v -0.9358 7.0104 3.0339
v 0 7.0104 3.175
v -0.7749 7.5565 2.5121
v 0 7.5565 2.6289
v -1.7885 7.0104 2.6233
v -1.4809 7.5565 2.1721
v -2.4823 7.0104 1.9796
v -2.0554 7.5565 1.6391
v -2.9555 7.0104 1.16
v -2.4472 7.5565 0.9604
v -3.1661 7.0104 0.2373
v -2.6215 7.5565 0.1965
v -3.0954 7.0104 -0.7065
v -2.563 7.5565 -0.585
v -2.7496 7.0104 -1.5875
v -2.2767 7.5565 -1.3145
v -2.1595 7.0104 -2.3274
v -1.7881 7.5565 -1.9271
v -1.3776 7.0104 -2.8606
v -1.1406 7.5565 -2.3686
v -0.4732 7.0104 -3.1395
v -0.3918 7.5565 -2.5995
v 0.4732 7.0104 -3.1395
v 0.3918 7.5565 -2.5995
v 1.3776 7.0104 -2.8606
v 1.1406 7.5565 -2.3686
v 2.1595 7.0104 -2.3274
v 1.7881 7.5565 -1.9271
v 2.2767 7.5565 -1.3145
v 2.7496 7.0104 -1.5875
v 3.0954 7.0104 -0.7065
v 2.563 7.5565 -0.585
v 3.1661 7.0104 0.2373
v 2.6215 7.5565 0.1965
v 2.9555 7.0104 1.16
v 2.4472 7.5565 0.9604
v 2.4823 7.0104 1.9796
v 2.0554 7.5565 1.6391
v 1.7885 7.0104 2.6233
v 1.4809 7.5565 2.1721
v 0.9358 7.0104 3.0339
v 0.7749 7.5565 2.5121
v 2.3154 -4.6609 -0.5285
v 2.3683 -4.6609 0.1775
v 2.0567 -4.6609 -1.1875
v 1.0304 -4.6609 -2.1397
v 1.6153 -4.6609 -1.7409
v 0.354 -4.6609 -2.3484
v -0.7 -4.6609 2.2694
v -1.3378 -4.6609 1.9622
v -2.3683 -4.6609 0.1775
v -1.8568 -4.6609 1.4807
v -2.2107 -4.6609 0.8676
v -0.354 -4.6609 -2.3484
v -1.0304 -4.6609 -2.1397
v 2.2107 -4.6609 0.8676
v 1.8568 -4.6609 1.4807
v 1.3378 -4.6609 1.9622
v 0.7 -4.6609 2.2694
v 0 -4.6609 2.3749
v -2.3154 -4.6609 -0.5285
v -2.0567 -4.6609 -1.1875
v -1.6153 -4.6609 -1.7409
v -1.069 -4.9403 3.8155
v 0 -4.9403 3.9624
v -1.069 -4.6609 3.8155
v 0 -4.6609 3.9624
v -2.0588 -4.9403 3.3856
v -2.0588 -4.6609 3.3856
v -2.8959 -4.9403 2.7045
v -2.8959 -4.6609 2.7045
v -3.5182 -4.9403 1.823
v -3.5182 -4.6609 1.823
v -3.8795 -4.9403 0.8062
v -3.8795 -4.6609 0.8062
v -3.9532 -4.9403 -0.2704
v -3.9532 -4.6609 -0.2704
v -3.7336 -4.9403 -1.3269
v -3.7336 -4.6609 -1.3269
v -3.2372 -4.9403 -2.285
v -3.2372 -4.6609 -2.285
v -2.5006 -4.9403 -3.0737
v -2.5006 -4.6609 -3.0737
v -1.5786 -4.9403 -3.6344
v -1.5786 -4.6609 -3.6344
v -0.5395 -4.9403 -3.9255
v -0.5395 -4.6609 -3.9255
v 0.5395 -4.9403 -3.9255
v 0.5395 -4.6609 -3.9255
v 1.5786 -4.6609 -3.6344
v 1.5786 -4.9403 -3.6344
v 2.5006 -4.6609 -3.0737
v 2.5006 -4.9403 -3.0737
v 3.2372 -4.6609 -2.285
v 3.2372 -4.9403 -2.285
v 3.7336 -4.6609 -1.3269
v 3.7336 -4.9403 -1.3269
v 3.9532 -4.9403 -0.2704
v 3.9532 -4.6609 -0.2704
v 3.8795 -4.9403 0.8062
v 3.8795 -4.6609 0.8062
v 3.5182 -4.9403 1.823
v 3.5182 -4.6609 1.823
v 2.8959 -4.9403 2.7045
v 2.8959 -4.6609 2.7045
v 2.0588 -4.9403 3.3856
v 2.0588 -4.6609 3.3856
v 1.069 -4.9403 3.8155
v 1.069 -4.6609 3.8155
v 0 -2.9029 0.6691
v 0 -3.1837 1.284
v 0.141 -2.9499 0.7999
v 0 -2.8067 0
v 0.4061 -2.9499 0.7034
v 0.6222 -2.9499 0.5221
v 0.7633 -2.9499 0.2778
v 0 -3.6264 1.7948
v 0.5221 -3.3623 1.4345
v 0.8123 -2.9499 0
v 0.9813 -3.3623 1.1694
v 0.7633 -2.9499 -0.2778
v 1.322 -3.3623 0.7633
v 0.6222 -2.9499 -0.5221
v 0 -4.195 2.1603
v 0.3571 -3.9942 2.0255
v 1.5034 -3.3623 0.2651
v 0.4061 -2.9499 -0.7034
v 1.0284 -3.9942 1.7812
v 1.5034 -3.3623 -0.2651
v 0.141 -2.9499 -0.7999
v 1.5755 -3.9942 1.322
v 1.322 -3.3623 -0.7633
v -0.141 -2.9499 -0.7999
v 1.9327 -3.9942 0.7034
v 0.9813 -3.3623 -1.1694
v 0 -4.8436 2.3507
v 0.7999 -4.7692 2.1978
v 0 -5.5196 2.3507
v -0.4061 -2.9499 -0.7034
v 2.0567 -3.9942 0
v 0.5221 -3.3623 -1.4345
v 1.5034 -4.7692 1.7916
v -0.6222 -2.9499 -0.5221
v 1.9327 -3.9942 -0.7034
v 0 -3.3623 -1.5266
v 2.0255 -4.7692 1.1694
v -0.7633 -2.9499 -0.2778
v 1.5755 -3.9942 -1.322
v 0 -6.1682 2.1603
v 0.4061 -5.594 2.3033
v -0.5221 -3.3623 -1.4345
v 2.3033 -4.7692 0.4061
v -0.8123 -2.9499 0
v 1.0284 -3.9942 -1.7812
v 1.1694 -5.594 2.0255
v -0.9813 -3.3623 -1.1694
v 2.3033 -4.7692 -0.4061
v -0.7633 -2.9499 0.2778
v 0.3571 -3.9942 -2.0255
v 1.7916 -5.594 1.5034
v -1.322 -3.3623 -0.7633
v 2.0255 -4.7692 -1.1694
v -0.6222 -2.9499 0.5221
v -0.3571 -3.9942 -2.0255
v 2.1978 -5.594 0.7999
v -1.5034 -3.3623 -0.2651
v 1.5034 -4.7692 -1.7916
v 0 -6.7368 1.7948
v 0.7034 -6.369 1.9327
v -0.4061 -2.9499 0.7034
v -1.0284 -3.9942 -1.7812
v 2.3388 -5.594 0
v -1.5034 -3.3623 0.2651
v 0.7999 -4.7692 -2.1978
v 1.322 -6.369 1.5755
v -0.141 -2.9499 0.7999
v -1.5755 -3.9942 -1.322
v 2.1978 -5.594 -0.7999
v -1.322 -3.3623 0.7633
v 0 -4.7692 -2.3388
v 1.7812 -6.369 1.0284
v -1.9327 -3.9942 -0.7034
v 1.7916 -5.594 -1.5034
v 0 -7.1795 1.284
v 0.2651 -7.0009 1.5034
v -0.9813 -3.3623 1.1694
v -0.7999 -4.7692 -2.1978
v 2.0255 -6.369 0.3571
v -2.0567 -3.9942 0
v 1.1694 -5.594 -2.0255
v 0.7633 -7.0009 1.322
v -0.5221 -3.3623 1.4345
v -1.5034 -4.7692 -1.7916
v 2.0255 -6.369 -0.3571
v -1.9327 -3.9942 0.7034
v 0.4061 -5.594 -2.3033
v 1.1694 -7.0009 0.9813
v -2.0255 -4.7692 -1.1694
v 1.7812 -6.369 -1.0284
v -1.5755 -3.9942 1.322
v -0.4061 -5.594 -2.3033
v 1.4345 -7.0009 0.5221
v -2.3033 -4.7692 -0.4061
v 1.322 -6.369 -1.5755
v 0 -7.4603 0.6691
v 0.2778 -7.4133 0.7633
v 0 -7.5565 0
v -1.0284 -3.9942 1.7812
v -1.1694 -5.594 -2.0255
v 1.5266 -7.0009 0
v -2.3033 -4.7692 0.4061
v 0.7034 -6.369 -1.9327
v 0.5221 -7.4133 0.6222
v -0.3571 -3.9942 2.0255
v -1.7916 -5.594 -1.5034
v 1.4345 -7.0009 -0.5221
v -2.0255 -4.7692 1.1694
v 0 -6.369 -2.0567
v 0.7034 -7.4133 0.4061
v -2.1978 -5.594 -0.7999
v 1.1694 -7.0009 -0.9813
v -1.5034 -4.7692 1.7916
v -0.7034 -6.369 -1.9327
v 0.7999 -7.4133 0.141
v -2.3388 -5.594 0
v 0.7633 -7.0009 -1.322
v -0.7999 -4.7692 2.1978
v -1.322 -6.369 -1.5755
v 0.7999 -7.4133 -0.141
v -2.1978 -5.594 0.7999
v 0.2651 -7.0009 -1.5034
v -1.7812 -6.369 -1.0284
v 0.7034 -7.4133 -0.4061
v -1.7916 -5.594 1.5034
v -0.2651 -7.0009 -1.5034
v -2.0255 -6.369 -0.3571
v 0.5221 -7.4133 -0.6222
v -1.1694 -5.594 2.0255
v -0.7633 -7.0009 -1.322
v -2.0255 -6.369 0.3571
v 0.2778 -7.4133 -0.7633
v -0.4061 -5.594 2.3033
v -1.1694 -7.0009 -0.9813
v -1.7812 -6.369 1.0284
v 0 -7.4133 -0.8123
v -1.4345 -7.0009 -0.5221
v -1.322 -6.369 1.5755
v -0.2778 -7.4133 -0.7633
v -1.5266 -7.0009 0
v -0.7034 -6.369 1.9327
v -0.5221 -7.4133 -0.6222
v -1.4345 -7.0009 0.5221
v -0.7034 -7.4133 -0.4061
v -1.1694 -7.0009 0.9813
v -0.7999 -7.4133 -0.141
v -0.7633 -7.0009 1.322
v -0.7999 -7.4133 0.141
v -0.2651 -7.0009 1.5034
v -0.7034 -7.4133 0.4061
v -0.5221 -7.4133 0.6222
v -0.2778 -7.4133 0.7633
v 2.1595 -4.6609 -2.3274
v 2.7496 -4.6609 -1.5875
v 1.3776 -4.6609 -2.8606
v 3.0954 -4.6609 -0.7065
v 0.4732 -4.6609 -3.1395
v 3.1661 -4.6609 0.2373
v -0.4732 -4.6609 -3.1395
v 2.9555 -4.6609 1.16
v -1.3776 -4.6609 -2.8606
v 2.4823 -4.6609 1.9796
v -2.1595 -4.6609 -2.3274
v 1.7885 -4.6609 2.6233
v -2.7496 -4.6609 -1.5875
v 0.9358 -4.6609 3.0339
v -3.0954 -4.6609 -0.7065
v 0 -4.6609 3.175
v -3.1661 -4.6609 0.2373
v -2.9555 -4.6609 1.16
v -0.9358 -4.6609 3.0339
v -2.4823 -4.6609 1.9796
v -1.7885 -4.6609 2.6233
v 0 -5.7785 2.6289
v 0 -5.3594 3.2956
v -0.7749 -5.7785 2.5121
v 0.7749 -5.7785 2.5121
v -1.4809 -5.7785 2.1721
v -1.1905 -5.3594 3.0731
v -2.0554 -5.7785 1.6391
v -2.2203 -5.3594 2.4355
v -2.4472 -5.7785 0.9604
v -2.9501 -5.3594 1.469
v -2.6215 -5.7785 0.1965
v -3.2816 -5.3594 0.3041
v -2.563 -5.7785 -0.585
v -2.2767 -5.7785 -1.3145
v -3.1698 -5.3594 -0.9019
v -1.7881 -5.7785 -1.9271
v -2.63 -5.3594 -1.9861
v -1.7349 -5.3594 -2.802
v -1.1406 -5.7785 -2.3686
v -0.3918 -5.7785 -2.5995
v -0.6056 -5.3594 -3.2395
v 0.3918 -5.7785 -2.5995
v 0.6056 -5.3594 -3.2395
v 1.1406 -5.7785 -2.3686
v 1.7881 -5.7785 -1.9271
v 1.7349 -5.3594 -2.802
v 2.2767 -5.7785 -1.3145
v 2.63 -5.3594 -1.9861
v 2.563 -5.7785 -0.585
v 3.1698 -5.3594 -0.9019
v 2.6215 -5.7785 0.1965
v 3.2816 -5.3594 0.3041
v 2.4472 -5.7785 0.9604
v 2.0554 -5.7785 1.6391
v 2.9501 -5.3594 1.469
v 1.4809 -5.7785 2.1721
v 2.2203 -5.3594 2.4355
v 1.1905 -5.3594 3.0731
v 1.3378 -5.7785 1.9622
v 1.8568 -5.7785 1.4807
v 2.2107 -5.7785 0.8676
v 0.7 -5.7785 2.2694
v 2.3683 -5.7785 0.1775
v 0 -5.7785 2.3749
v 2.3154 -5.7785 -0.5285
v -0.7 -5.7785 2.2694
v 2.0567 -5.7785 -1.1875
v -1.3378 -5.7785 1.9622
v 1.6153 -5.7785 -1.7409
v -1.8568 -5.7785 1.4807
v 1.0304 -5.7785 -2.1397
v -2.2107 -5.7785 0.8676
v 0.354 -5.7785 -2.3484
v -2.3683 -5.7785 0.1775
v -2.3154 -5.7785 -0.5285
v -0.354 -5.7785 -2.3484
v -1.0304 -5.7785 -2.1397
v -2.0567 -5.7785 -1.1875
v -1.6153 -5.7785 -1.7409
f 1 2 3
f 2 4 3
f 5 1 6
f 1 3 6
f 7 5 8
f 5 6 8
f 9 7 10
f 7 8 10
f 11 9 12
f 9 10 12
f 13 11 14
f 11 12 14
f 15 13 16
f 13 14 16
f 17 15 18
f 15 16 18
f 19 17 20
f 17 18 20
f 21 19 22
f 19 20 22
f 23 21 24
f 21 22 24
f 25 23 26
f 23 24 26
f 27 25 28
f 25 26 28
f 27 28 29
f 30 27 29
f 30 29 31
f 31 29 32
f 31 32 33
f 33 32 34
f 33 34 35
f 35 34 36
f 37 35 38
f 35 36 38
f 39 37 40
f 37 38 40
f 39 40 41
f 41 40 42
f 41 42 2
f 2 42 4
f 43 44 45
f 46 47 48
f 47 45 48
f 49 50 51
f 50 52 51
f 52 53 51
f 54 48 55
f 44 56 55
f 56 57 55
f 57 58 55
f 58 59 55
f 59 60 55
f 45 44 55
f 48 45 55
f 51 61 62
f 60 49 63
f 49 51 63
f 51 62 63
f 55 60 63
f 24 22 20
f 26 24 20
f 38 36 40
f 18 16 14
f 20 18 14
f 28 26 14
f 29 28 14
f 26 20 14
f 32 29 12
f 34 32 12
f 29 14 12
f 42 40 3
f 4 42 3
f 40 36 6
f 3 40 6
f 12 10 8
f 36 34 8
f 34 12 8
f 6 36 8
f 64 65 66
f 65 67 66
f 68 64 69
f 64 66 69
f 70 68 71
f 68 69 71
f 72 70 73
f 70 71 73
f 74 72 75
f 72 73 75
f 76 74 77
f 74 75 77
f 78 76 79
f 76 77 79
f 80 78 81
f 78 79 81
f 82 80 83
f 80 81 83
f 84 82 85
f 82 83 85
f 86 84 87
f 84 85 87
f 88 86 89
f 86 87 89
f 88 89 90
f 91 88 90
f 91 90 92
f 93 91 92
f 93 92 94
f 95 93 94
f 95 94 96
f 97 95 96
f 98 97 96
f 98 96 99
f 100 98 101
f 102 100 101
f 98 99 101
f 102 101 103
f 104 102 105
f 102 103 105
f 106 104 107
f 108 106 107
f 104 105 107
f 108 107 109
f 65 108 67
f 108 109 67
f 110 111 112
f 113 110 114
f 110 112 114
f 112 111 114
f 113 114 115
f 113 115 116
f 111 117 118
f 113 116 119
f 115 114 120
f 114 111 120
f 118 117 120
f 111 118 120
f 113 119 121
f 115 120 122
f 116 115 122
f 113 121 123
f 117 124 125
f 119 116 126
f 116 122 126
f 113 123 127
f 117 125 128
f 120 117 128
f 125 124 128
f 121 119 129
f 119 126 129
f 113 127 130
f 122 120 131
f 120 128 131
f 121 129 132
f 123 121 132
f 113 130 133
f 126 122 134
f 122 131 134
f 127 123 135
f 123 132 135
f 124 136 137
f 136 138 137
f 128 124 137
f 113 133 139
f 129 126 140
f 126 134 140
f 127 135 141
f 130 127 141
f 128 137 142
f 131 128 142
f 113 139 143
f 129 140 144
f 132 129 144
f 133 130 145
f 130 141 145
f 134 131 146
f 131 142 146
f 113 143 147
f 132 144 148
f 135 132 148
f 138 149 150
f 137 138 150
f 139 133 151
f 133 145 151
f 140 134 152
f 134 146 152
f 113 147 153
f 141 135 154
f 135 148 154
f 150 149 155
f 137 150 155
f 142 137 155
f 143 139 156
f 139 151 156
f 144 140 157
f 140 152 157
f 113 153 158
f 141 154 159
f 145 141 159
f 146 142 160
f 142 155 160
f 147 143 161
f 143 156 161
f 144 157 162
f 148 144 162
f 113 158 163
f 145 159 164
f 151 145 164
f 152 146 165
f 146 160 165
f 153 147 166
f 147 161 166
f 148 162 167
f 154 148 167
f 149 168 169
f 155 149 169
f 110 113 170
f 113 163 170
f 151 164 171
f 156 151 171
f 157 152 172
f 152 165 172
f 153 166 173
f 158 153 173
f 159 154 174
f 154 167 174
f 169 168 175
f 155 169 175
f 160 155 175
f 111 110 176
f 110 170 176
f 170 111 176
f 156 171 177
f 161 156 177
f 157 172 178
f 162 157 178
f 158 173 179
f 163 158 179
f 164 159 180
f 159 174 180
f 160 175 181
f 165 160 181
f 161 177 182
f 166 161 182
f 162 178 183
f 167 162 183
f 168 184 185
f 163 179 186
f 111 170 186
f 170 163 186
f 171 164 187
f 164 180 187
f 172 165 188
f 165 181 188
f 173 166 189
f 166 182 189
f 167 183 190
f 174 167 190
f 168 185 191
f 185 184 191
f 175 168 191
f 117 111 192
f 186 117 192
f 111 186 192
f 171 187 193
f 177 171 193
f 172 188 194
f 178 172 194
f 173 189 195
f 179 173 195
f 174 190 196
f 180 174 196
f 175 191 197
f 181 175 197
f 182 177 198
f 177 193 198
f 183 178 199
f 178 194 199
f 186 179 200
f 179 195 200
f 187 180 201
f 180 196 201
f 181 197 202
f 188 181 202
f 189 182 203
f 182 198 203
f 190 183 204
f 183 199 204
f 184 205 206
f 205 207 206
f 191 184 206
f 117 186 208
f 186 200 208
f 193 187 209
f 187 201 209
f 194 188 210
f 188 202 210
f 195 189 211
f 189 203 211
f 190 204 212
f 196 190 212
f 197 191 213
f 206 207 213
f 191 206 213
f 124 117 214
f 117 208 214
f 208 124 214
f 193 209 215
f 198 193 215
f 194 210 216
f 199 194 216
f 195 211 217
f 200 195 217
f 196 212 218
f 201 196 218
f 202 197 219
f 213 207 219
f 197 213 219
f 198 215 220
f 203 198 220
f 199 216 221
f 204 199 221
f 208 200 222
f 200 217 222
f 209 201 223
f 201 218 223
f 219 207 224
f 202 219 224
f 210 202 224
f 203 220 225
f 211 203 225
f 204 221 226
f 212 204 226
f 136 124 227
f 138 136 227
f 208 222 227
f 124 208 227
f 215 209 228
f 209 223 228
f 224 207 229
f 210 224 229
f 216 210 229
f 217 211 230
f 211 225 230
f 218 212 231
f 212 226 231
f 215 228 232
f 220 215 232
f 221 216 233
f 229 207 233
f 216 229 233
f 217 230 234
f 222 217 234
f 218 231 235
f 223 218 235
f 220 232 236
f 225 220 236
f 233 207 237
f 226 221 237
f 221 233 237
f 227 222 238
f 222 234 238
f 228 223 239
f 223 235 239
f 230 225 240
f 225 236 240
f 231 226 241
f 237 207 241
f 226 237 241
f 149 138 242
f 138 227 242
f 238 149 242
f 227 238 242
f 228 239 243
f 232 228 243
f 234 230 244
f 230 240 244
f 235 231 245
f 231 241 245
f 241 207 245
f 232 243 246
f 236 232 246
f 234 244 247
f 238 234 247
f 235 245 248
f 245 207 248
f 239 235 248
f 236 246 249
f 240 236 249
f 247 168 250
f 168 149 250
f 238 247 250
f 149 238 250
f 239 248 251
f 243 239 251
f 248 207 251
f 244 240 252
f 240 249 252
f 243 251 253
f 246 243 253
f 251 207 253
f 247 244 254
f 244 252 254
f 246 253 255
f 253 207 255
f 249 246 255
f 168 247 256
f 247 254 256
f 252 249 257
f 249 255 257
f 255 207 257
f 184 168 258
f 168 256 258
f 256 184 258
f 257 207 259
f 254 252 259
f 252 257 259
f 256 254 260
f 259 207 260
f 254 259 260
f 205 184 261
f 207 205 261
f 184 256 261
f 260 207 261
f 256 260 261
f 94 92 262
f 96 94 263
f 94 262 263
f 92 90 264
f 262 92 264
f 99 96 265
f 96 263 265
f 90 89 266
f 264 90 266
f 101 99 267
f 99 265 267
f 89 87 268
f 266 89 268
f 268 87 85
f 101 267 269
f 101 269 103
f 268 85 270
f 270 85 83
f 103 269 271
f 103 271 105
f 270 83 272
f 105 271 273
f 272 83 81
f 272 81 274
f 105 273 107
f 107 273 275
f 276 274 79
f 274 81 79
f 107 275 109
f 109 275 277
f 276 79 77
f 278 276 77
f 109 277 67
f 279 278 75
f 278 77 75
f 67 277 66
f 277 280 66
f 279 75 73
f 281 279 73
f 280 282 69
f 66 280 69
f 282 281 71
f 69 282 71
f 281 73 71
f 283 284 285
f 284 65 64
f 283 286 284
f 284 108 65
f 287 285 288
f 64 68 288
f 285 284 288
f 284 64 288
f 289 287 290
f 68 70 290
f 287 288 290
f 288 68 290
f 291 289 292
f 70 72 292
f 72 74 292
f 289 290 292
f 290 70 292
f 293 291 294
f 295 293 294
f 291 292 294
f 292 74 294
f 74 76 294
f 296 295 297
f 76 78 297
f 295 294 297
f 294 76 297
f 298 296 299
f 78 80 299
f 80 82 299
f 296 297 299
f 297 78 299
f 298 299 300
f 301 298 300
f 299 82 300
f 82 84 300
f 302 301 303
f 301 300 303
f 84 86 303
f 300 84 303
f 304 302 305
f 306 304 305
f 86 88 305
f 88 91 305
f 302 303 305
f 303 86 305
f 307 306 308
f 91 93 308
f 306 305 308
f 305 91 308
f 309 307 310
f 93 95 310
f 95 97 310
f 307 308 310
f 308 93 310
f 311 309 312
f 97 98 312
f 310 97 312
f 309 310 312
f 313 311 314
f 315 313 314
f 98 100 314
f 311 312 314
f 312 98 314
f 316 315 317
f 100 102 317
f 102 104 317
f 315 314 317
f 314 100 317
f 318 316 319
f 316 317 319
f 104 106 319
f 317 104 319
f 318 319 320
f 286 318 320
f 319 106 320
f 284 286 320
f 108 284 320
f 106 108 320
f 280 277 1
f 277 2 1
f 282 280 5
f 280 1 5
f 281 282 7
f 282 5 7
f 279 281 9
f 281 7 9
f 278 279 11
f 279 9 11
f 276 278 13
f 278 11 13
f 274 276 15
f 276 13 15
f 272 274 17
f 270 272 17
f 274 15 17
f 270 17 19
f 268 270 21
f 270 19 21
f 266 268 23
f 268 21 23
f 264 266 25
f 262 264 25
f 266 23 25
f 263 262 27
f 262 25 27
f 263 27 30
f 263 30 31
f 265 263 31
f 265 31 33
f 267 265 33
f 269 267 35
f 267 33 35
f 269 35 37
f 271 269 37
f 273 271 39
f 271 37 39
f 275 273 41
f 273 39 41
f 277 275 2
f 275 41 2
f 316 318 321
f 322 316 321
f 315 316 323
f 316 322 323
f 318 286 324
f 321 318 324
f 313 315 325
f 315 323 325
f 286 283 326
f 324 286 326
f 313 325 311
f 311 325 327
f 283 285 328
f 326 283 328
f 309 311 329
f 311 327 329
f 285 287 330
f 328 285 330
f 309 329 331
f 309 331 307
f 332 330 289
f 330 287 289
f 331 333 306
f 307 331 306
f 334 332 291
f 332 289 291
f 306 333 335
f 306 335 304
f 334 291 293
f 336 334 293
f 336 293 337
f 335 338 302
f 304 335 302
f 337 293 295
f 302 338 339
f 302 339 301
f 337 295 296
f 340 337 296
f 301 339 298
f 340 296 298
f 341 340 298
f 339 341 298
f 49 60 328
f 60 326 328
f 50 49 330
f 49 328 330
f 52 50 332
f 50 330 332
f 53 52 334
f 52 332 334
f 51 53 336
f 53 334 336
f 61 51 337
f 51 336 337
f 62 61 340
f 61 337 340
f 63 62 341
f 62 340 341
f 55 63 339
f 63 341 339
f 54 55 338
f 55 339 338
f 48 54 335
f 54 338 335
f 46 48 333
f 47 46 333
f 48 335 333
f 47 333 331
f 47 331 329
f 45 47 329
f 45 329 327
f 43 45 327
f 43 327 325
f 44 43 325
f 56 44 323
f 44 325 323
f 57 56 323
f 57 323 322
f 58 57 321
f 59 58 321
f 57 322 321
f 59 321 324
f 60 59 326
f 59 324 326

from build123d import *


with BuildPart() as part:
    # Sketch24 → Revolve2 (revolve)
    with BuildSketch(Plane(origin=(0, 0, 0), x_dir=(0, 0, -1), z_dir=(1, 0, 0))):
        Polygon((-3.9624, -4.9403), (-3.9624, -4.6609), (-3.175, -4.6609), (-3.175, 7.0104), (-2.6289, 7.5565), (0, 7.5565), (0, -4.6609), (-2.3749, -4.6609), (-2.3749, -5.7785), (-2.6289, -5.7785), align=None)
    revolve(axis=Axis((0, 7.5565, 0), (0, -1, 0)))


with BuildPart() as body_2:
    # Sketch25 → Revolve3 (revolve)
    with BuildSketch(Plane(origin=(0, 0, 0), x_dir=(0, 0, -1), z_dir=(1, 0, 0))):
        with BuildLine():
            Line((0, -7.5565), (0, -2.8067))
            ThreePointArc((0, -2.8067), (-2.3749, -5.1816), (0, -7.5565))
        make_face()
    revolve(axis=Axis((0, -4.6609, 0), (0, 1, 0)))


solid = Compound([part.part, body_2.part])
